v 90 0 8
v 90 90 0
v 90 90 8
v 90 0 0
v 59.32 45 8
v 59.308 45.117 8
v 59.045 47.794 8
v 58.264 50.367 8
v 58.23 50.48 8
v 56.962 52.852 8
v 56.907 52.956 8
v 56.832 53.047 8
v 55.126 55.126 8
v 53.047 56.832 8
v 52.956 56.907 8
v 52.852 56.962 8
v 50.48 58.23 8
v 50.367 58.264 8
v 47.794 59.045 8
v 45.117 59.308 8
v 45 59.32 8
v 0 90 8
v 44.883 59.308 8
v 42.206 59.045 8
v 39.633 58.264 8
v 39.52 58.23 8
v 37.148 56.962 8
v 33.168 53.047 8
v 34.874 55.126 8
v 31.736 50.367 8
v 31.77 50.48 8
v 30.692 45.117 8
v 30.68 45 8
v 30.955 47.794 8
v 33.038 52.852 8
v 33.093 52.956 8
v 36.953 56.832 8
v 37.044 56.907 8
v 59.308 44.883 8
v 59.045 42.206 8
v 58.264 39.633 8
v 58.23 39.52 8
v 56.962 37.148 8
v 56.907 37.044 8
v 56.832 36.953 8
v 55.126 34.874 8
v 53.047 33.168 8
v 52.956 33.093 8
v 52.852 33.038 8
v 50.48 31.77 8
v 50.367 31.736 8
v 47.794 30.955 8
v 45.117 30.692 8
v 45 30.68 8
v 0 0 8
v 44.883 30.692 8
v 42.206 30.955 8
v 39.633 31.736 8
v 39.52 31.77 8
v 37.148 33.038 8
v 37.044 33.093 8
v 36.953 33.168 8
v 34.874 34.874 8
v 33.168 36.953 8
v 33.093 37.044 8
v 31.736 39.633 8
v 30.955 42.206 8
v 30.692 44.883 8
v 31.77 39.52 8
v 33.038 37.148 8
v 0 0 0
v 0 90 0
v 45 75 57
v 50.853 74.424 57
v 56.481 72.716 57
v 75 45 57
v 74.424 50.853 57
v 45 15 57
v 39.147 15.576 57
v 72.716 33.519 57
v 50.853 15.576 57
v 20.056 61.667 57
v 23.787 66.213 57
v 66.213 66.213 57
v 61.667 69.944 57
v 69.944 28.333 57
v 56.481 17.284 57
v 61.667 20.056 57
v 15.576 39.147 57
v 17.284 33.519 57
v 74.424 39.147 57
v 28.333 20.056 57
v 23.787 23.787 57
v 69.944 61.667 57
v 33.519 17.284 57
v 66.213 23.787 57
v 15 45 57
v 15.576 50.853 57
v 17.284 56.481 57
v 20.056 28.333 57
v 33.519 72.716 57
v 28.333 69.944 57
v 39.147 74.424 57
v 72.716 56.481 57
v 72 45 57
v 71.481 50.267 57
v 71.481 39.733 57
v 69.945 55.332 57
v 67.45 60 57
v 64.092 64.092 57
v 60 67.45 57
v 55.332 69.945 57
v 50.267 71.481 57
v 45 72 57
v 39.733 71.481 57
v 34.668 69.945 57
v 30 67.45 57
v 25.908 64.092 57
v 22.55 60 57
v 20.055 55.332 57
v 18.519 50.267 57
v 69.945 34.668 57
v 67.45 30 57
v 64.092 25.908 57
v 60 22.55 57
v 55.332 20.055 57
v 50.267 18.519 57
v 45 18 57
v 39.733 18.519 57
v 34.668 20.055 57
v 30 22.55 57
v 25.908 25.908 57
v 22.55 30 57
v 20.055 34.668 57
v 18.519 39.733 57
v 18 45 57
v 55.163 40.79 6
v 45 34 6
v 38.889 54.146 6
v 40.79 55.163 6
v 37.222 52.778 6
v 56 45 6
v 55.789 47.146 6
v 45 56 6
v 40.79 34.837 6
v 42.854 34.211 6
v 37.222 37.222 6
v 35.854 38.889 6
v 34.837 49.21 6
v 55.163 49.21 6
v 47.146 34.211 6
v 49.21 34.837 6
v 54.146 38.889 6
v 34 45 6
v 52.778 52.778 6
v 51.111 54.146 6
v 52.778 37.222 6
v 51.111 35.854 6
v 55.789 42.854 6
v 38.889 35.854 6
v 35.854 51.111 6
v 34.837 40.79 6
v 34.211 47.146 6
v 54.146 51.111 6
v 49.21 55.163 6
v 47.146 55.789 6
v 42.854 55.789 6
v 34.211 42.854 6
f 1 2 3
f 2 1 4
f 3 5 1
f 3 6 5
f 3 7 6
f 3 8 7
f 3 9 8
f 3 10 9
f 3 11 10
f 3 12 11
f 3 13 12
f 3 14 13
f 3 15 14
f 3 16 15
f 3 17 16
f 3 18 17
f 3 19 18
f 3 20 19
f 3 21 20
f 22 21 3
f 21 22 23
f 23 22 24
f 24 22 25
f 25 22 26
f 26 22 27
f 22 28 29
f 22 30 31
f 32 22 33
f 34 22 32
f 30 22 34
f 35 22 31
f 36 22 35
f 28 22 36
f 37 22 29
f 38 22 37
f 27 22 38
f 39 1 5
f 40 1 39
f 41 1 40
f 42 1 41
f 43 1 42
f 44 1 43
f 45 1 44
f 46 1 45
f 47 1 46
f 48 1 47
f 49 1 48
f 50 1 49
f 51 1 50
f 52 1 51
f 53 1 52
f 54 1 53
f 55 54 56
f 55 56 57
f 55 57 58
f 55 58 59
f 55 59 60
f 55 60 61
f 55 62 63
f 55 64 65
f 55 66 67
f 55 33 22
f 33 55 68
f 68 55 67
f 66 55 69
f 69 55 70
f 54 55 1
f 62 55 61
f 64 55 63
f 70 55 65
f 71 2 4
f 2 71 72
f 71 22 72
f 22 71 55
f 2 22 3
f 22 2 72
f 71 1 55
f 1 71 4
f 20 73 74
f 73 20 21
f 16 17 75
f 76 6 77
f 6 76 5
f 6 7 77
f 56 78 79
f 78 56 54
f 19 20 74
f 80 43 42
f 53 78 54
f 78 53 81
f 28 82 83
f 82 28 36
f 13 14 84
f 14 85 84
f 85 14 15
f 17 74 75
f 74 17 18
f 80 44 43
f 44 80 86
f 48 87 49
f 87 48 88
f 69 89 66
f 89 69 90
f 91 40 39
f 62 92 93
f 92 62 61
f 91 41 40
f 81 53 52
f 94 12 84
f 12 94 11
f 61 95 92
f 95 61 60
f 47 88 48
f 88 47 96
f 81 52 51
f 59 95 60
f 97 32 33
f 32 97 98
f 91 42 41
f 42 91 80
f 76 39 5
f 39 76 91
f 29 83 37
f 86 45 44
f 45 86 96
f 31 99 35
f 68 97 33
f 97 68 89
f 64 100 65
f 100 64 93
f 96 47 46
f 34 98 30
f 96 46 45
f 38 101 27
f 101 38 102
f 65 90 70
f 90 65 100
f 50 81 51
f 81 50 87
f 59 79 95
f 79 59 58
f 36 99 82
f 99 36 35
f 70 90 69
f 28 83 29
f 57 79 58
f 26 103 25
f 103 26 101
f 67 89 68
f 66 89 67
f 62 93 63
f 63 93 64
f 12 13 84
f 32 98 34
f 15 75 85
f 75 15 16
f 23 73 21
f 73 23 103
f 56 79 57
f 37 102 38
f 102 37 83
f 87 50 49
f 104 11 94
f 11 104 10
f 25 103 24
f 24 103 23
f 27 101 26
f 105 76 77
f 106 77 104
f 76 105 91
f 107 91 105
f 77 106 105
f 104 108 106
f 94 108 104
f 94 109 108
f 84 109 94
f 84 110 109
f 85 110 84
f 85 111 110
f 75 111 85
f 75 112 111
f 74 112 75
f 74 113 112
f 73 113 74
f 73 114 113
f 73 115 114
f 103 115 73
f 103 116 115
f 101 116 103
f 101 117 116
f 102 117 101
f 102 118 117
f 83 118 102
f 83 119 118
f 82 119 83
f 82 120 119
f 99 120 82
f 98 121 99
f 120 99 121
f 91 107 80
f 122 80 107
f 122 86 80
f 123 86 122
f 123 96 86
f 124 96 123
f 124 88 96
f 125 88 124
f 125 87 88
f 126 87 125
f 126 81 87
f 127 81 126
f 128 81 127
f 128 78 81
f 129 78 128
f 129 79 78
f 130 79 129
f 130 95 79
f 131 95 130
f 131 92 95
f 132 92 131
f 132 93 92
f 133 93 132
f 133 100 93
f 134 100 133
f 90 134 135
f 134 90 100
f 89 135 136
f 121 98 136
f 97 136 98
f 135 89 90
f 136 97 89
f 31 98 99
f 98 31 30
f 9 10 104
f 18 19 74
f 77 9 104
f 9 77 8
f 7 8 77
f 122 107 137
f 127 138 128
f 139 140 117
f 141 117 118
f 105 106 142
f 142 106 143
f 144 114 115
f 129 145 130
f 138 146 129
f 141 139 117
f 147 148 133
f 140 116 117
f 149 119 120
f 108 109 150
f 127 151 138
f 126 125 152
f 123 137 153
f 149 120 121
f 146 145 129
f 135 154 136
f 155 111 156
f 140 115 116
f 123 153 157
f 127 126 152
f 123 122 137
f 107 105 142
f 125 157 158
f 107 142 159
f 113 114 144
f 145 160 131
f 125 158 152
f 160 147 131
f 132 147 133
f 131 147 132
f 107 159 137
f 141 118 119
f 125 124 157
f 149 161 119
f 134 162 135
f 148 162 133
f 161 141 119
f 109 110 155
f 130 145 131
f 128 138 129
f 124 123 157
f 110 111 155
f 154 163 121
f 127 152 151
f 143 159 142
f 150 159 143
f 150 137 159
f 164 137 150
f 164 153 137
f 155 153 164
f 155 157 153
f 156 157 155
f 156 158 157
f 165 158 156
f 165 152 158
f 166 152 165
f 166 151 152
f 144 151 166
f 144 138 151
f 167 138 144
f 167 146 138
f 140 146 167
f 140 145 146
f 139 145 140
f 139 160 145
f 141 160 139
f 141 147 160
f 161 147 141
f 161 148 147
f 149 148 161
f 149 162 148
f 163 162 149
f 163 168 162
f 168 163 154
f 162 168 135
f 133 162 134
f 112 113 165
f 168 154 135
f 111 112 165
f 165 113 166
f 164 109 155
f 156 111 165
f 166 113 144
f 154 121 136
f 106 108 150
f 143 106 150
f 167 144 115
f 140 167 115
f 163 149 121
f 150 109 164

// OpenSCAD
$fn = 32;

// ----------------------------------------------------------------------
// Hopper: funnel with square flange
// ----------------------------------------------------------------------

// --- parameters (mm) ---
fl = 90;                  // flange side, X and Y
fl_t = 8;                 // flange thickness
cone_h = 50;              // cone height above the flange
top_d = 60;               // cone mouth diameter
bot_d = 28;               // cone spout diameter
wall = 3;                 // cone wall thickness

bore_d = bot_d - 2 * wall;  // spout bore diameter
total_h = fl_t + cone_h - 1;  // overall height

difference() {
  union() {
    cube([fl, fl, fl_t]);
    translate([fl / 2, fl / 2, fl_t - 1])
      cylinder(h = cone_h, d1 = bot_d, d2 = top_d);
  }
  translate([fl / 2, fl / 2, fl_t - 2])
    cylinder(h = cone_h + 1, d1 = bore_d, d2 = top_d - 2 * wall);
}
